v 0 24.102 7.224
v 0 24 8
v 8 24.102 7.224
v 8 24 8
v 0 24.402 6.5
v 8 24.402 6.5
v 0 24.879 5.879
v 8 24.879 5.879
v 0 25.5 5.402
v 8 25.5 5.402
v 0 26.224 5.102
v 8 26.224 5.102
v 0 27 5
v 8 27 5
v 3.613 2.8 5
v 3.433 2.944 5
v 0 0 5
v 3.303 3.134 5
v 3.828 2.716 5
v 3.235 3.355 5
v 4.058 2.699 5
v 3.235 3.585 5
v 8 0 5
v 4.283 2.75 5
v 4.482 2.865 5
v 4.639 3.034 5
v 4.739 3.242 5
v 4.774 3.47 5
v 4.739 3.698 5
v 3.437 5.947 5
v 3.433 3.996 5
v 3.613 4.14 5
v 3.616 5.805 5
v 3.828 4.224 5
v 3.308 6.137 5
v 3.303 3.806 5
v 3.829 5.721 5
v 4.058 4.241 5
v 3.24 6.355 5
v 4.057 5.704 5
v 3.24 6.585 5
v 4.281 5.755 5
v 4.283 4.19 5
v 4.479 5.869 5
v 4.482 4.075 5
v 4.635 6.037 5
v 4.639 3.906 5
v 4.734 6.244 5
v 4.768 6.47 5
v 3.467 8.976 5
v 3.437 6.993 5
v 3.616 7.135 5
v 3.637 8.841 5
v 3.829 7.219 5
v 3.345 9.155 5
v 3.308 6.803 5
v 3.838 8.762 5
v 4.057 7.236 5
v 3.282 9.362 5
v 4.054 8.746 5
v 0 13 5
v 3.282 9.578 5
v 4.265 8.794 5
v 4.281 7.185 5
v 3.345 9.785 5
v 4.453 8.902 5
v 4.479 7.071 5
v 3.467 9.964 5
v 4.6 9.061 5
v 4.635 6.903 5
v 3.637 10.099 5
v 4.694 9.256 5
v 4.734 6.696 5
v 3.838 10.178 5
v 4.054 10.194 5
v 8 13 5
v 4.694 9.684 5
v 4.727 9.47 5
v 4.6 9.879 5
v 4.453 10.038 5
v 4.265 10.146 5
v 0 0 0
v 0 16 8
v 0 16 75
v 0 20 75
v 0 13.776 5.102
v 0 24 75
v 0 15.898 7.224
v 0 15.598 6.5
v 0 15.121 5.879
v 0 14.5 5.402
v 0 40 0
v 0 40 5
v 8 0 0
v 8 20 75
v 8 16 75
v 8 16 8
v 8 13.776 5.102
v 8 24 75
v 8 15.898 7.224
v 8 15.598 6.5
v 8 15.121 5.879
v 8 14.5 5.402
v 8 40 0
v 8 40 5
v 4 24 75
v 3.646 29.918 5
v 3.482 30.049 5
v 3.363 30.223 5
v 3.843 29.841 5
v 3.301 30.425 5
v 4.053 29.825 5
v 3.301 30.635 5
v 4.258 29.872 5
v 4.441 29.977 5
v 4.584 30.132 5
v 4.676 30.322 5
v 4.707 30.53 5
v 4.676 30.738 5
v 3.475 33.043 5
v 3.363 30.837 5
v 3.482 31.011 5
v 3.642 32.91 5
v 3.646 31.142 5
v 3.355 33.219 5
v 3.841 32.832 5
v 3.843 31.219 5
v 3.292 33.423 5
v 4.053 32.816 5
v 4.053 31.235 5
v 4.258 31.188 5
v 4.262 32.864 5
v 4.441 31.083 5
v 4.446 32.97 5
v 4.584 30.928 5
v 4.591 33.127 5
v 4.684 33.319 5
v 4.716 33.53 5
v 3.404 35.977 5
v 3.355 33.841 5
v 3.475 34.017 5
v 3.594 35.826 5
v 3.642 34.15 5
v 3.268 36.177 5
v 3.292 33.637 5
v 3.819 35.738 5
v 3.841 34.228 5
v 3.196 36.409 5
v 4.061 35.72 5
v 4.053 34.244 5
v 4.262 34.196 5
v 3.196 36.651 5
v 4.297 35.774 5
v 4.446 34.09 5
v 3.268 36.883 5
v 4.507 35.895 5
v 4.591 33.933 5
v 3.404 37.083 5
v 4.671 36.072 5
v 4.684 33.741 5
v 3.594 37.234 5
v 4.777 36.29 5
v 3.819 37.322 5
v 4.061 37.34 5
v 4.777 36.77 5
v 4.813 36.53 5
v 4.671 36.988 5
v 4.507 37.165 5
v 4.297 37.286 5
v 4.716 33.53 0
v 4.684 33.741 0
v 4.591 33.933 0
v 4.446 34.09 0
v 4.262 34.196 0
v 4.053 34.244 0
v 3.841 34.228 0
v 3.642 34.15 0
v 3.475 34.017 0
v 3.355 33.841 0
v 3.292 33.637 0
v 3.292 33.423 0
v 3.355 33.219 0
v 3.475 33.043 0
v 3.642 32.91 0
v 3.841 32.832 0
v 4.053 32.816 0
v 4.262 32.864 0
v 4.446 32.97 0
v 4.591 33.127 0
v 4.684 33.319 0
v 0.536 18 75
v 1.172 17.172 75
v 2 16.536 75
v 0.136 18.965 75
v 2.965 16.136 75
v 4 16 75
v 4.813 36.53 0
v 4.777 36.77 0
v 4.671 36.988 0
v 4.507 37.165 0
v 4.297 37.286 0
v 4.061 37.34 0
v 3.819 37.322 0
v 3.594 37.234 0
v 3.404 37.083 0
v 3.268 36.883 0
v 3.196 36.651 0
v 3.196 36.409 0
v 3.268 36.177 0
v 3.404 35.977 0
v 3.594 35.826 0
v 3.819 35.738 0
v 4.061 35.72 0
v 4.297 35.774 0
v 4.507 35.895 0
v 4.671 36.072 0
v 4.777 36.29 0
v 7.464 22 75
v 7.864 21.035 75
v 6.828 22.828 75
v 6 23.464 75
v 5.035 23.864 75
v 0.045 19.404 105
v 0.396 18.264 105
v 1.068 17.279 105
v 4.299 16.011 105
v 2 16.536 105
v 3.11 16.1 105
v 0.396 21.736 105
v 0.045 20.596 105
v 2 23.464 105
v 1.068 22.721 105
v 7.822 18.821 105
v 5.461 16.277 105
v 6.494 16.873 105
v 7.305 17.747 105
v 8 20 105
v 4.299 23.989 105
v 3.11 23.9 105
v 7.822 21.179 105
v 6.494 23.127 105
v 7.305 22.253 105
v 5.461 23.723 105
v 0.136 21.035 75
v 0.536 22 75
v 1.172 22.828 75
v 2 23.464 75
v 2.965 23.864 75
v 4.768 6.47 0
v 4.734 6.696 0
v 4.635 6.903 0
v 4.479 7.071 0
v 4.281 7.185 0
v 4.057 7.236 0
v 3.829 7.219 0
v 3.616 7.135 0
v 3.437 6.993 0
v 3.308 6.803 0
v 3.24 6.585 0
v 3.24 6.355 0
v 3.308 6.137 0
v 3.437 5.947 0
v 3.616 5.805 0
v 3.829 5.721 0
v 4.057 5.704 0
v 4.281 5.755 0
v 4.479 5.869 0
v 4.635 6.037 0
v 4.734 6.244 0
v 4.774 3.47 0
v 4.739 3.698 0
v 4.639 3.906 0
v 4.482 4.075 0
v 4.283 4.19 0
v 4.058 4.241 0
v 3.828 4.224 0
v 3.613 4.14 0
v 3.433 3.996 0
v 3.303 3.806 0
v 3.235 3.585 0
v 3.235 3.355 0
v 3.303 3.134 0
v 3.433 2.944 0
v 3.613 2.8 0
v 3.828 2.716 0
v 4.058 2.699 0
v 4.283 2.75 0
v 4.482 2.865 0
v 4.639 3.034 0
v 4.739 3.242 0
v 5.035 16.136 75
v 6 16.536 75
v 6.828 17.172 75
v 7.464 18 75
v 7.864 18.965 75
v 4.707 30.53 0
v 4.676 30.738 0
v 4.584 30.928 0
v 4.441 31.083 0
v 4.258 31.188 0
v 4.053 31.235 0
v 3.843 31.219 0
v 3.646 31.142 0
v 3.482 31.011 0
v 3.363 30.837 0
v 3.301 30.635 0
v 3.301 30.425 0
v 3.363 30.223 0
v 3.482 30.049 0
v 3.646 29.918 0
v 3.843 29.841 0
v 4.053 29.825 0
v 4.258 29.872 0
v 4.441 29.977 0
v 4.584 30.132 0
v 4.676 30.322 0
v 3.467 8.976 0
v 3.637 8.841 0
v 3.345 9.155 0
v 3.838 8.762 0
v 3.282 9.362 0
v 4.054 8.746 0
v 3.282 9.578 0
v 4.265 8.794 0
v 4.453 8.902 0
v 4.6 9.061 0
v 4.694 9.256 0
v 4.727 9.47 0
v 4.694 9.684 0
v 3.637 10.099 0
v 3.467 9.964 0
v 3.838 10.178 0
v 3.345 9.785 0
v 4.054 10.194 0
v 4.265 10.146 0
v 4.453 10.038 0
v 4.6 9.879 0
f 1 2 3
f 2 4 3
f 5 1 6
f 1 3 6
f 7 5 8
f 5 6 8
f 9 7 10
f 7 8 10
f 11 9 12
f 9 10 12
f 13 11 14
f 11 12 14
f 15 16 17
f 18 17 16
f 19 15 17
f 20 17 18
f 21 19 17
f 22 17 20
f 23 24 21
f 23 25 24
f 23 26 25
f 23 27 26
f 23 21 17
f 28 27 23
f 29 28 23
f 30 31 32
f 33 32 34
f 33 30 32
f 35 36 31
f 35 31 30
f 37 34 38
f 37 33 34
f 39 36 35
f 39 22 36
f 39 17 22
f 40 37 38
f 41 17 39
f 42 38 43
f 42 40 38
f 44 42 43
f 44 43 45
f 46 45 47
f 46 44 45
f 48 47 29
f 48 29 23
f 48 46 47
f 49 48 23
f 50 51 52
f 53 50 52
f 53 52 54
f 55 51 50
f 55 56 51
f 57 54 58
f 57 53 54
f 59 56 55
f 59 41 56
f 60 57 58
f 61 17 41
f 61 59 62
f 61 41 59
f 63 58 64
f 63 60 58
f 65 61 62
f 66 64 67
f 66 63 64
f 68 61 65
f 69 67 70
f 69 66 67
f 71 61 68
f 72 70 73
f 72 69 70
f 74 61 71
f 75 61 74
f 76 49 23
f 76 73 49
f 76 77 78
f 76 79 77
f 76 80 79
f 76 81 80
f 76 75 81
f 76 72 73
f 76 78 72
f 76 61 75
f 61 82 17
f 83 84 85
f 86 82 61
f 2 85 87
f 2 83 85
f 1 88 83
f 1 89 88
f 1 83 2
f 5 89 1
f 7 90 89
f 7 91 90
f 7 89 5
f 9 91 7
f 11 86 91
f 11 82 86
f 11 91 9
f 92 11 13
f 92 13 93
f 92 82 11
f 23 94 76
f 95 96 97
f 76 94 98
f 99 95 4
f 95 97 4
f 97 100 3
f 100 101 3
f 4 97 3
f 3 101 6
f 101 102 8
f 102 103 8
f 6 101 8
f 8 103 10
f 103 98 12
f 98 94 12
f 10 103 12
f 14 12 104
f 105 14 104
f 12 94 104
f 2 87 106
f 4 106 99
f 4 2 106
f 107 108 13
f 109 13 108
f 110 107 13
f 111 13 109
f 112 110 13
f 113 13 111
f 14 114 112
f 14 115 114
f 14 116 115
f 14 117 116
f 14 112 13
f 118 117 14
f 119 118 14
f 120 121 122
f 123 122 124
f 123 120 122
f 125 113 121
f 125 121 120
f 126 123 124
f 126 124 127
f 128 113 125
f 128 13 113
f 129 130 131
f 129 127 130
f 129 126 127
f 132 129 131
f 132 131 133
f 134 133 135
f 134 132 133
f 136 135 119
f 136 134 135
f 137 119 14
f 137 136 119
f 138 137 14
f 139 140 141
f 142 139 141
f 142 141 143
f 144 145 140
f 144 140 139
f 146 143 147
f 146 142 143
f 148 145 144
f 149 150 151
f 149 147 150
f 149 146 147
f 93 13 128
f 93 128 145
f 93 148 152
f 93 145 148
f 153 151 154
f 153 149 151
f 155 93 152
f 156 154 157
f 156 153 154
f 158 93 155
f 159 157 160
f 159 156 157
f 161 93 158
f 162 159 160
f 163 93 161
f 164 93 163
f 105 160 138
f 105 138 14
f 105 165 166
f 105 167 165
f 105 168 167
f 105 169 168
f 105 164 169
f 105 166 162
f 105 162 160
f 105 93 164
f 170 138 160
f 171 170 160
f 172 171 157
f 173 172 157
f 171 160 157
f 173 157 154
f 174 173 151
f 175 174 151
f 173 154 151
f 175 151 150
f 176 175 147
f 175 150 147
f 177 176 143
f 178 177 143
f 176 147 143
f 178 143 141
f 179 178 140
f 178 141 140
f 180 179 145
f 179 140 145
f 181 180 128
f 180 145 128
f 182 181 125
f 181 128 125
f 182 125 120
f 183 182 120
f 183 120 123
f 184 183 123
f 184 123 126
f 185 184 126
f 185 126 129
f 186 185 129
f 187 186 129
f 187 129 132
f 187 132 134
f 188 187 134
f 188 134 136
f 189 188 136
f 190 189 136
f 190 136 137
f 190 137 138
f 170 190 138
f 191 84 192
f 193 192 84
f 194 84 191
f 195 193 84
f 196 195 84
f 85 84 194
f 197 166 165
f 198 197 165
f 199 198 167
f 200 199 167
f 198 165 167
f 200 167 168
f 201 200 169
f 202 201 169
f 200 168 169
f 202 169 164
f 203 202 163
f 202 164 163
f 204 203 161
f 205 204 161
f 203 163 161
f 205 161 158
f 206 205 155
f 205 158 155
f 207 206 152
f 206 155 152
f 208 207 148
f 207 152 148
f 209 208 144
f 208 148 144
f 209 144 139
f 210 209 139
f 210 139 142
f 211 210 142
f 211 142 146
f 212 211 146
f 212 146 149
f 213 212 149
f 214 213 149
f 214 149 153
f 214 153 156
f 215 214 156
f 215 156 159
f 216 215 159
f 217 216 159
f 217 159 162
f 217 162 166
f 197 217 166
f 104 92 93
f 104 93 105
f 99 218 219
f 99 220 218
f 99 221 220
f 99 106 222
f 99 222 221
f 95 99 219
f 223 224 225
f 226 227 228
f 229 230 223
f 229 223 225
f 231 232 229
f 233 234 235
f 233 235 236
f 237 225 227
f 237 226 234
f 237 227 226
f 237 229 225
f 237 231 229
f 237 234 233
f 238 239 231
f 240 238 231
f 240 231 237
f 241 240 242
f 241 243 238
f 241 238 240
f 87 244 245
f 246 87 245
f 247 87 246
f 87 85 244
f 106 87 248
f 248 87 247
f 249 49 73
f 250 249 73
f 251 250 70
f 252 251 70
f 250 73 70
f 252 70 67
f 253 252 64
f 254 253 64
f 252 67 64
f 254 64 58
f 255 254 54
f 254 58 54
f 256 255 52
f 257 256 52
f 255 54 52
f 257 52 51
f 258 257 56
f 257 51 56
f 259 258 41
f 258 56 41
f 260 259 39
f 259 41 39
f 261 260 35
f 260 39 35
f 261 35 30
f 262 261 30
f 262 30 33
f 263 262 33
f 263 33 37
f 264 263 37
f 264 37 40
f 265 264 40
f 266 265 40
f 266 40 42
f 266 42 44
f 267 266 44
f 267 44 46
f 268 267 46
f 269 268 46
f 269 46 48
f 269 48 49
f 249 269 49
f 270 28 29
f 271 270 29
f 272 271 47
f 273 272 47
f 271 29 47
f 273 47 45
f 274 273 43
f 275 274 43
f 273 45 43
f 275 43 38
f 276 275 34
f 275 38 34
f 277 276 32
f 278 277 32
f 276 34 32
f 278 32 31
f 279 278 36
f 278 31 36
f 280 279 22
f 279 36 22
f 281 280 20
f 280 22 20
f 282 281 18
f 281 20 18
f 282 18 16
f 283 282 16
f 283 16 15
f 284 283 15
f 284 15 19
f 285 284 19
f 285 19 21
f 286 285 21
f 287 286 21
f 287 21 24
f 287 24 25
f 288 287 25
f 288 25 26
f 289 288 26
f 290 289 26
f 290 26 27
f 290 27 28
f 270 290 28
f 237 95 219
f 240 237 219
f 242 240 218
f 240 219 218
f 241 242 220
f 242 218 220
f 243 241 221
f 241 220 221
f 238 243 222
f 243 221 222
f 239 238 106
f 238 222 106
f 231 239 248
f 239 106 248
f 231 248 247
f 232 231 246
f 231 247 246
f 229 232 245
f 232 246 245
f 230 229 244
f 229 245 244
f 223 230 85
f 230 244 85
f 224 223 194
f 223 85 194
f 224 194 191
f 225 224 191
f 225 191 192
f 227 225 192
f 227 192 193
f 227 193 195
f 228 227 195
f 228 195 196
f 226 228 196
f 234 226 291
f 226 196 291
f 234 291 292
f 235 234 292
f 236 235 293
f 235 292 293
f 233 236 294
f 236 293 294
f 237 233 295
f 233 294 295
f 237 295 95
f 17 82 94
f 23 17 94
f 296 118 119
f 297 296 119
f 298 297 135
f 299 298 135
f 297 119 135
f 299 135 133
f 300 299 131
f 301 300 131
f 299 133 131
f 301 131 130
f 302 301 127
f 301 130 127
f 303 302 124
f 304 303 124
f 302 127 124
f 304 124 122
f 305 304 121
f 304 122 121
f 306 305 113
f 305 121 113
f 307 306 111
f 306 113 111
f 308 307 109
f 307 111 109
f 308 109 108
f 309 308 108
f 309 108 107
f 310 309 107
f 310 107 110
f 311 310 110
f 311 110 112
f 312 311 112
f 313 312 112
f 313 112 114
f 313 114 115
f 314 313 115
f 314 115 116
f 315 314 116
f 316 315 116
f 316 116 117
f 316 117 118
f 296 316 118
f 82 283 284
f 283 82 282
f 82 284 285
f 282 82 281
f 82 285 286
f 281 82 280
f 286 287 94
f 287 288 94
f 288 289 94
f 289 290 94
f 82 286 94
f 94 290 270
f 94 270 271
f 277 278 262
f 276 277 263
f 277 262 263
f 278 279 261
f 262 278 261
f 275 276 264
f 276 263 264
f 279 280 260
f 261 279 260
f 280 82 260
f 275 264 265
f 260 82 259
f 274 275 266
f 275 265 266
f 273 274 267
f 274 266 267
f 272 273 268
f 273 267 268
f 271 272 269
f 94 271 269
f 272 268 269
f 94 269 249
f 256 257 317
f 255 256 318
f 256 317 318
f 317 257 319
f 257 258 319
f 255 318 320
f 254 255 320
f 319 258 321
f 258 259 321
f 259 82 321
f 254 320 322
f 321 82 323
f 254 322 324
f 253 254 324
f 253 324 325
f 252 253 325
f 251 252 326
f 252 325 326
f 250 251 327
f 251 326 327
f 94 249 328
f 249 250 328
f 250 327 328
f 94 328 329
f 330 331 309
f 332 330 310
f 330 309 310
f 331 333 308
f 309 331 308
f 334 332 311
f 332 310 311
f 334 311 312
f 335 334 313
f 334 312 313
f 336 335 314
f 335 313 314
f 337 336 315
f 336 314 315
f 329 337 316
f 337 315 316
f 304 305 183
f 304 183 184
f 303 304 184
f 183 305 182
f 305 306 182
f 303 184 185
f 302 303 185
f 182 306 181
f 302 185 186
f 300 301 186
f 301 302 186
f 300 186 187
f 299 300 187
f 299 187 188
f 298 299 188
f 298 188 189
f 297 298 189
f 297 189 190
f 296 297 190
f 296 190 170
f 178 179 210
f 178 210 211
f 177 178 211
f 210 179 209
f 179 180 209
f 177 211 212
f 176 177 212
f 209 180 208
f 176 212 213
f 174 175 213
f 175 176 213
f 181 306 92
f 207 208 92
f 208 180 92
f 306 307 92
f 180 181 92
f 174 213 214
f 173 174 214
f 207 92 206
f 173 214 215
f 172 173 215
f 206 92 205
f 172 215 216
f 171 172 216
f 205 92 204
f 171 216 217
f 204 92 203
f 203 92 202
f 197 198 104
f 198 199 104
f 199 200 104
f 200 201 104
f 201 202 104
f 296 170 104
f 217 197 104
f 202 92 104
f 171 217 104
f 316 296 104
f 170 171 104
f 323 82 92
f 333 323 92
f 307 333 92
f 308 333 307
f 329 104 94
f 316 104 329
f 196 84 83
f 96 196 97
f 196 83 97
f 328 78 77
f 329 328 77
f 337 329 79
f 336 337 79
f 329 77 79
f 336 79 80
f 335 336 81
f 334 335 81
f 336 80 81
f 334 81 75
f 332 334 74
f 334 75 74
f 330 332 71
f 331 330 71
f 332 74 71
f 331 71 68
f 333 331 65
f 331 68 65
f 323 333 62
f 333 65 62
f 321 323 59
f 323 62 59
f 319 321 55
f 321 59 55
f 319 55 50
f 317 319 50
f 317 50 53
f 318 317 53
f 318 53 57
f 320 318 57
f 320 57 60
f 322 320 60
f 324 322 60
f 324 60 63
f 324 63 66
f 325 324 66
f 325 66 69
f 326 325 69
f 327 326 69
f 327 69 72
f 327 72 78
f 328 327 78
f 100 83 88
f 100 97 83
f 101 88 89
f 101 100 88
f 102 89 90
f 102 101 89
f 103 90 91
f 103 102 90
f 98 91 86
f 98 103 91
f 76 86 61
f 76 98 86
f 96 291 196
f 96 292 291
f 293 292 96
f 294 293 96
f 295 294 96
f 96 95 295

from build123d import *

# Parameters (mm, degrees)
SKETCH1_W           = 8
SKETCH1_H           = 40
BOSS_EXTRUDE1_DEPTH = 5
SKETCH3_W           = 8
SKETCH3_H           = 8
BOSS_EXTRUDE3_DEPTH = 70
SKETCH4_R           = 4
BOSS_EXTRUDE4_DEPTH = 30
SKETCH5_R           = 0.773565548
SKETCH5_R_2         = 0.768304054
SKETCH5_R_3         = 0.726526648
SKETCH5_R_4         = 0.707209462
SKETCH5_R_5         = 0.715862797
SKETCH5_R_6         = 0.812614346
CUT_EXTRUDE1_DEPTH  = 10
FILLET1_R           = 3


with BuildPart() as part:
    # Sketch1 → Boss-Extrude1 (new body)
    with BuildSketch(Plane.XY):
        with Locations((4, 20)):
            Rectangle(SKETCH1_W, SKETCH1_H)
    extrude(amount=BOSS_EXTRUDE1_DEPTH)

    # Sketch3 → Boss-Extrude3 (add)
    with BuildSketch(Plane.XY.offset(5)):
        with Locations((4, 20)):
            Rectangle(SKETCH3_W, SKETCH3_H)
    extrude(amount=BOSS_EXTRUDE3_DEPTH)

    # Sketch4 → Boss-Extrude4 (add)
    with BuildSketch(Plane.XY.offset(75)):
        with Locations((4, 20)):
            Circle(SKETCH4_R)
    extrude(amount=BOSS_EXTRUDE4_DEPTH)

    # Sketch5 → Cut-Extrude1 (cut)
    with BuildSketch(Plane.XY.offset(5)):
        with Locations((4, 3.47)):
            Circle(SKETCH5_R)
        with Locations((4, 6.47)):
            Circle(SKETCH5_R_2)
        with Locations((4, 9.47)):
            Circle(SKETCH5_R_3)
        with Locations((4, 30.53)):
            Circle(SKETCH5_R_4)
        with Locations((4, 33.53)):
            Circle(SKETCH5_R_5)
        with Locations((4, 36.53)):
            Circle(SKETCH5_R_6)
    extrude(amount=-CUT_EXTRUDE1_DEPTH, mode=Mode.SUBTRACT)

    # Fillet1
    fillet1_edges = [part.edges().sort_by_distance(p)[0] for p in [
        (4, 16, 5),
        (4, 24, 5),
    ]]
    fillet(fillet1_edges, radius=FILLET1_R)


solid = part.part
